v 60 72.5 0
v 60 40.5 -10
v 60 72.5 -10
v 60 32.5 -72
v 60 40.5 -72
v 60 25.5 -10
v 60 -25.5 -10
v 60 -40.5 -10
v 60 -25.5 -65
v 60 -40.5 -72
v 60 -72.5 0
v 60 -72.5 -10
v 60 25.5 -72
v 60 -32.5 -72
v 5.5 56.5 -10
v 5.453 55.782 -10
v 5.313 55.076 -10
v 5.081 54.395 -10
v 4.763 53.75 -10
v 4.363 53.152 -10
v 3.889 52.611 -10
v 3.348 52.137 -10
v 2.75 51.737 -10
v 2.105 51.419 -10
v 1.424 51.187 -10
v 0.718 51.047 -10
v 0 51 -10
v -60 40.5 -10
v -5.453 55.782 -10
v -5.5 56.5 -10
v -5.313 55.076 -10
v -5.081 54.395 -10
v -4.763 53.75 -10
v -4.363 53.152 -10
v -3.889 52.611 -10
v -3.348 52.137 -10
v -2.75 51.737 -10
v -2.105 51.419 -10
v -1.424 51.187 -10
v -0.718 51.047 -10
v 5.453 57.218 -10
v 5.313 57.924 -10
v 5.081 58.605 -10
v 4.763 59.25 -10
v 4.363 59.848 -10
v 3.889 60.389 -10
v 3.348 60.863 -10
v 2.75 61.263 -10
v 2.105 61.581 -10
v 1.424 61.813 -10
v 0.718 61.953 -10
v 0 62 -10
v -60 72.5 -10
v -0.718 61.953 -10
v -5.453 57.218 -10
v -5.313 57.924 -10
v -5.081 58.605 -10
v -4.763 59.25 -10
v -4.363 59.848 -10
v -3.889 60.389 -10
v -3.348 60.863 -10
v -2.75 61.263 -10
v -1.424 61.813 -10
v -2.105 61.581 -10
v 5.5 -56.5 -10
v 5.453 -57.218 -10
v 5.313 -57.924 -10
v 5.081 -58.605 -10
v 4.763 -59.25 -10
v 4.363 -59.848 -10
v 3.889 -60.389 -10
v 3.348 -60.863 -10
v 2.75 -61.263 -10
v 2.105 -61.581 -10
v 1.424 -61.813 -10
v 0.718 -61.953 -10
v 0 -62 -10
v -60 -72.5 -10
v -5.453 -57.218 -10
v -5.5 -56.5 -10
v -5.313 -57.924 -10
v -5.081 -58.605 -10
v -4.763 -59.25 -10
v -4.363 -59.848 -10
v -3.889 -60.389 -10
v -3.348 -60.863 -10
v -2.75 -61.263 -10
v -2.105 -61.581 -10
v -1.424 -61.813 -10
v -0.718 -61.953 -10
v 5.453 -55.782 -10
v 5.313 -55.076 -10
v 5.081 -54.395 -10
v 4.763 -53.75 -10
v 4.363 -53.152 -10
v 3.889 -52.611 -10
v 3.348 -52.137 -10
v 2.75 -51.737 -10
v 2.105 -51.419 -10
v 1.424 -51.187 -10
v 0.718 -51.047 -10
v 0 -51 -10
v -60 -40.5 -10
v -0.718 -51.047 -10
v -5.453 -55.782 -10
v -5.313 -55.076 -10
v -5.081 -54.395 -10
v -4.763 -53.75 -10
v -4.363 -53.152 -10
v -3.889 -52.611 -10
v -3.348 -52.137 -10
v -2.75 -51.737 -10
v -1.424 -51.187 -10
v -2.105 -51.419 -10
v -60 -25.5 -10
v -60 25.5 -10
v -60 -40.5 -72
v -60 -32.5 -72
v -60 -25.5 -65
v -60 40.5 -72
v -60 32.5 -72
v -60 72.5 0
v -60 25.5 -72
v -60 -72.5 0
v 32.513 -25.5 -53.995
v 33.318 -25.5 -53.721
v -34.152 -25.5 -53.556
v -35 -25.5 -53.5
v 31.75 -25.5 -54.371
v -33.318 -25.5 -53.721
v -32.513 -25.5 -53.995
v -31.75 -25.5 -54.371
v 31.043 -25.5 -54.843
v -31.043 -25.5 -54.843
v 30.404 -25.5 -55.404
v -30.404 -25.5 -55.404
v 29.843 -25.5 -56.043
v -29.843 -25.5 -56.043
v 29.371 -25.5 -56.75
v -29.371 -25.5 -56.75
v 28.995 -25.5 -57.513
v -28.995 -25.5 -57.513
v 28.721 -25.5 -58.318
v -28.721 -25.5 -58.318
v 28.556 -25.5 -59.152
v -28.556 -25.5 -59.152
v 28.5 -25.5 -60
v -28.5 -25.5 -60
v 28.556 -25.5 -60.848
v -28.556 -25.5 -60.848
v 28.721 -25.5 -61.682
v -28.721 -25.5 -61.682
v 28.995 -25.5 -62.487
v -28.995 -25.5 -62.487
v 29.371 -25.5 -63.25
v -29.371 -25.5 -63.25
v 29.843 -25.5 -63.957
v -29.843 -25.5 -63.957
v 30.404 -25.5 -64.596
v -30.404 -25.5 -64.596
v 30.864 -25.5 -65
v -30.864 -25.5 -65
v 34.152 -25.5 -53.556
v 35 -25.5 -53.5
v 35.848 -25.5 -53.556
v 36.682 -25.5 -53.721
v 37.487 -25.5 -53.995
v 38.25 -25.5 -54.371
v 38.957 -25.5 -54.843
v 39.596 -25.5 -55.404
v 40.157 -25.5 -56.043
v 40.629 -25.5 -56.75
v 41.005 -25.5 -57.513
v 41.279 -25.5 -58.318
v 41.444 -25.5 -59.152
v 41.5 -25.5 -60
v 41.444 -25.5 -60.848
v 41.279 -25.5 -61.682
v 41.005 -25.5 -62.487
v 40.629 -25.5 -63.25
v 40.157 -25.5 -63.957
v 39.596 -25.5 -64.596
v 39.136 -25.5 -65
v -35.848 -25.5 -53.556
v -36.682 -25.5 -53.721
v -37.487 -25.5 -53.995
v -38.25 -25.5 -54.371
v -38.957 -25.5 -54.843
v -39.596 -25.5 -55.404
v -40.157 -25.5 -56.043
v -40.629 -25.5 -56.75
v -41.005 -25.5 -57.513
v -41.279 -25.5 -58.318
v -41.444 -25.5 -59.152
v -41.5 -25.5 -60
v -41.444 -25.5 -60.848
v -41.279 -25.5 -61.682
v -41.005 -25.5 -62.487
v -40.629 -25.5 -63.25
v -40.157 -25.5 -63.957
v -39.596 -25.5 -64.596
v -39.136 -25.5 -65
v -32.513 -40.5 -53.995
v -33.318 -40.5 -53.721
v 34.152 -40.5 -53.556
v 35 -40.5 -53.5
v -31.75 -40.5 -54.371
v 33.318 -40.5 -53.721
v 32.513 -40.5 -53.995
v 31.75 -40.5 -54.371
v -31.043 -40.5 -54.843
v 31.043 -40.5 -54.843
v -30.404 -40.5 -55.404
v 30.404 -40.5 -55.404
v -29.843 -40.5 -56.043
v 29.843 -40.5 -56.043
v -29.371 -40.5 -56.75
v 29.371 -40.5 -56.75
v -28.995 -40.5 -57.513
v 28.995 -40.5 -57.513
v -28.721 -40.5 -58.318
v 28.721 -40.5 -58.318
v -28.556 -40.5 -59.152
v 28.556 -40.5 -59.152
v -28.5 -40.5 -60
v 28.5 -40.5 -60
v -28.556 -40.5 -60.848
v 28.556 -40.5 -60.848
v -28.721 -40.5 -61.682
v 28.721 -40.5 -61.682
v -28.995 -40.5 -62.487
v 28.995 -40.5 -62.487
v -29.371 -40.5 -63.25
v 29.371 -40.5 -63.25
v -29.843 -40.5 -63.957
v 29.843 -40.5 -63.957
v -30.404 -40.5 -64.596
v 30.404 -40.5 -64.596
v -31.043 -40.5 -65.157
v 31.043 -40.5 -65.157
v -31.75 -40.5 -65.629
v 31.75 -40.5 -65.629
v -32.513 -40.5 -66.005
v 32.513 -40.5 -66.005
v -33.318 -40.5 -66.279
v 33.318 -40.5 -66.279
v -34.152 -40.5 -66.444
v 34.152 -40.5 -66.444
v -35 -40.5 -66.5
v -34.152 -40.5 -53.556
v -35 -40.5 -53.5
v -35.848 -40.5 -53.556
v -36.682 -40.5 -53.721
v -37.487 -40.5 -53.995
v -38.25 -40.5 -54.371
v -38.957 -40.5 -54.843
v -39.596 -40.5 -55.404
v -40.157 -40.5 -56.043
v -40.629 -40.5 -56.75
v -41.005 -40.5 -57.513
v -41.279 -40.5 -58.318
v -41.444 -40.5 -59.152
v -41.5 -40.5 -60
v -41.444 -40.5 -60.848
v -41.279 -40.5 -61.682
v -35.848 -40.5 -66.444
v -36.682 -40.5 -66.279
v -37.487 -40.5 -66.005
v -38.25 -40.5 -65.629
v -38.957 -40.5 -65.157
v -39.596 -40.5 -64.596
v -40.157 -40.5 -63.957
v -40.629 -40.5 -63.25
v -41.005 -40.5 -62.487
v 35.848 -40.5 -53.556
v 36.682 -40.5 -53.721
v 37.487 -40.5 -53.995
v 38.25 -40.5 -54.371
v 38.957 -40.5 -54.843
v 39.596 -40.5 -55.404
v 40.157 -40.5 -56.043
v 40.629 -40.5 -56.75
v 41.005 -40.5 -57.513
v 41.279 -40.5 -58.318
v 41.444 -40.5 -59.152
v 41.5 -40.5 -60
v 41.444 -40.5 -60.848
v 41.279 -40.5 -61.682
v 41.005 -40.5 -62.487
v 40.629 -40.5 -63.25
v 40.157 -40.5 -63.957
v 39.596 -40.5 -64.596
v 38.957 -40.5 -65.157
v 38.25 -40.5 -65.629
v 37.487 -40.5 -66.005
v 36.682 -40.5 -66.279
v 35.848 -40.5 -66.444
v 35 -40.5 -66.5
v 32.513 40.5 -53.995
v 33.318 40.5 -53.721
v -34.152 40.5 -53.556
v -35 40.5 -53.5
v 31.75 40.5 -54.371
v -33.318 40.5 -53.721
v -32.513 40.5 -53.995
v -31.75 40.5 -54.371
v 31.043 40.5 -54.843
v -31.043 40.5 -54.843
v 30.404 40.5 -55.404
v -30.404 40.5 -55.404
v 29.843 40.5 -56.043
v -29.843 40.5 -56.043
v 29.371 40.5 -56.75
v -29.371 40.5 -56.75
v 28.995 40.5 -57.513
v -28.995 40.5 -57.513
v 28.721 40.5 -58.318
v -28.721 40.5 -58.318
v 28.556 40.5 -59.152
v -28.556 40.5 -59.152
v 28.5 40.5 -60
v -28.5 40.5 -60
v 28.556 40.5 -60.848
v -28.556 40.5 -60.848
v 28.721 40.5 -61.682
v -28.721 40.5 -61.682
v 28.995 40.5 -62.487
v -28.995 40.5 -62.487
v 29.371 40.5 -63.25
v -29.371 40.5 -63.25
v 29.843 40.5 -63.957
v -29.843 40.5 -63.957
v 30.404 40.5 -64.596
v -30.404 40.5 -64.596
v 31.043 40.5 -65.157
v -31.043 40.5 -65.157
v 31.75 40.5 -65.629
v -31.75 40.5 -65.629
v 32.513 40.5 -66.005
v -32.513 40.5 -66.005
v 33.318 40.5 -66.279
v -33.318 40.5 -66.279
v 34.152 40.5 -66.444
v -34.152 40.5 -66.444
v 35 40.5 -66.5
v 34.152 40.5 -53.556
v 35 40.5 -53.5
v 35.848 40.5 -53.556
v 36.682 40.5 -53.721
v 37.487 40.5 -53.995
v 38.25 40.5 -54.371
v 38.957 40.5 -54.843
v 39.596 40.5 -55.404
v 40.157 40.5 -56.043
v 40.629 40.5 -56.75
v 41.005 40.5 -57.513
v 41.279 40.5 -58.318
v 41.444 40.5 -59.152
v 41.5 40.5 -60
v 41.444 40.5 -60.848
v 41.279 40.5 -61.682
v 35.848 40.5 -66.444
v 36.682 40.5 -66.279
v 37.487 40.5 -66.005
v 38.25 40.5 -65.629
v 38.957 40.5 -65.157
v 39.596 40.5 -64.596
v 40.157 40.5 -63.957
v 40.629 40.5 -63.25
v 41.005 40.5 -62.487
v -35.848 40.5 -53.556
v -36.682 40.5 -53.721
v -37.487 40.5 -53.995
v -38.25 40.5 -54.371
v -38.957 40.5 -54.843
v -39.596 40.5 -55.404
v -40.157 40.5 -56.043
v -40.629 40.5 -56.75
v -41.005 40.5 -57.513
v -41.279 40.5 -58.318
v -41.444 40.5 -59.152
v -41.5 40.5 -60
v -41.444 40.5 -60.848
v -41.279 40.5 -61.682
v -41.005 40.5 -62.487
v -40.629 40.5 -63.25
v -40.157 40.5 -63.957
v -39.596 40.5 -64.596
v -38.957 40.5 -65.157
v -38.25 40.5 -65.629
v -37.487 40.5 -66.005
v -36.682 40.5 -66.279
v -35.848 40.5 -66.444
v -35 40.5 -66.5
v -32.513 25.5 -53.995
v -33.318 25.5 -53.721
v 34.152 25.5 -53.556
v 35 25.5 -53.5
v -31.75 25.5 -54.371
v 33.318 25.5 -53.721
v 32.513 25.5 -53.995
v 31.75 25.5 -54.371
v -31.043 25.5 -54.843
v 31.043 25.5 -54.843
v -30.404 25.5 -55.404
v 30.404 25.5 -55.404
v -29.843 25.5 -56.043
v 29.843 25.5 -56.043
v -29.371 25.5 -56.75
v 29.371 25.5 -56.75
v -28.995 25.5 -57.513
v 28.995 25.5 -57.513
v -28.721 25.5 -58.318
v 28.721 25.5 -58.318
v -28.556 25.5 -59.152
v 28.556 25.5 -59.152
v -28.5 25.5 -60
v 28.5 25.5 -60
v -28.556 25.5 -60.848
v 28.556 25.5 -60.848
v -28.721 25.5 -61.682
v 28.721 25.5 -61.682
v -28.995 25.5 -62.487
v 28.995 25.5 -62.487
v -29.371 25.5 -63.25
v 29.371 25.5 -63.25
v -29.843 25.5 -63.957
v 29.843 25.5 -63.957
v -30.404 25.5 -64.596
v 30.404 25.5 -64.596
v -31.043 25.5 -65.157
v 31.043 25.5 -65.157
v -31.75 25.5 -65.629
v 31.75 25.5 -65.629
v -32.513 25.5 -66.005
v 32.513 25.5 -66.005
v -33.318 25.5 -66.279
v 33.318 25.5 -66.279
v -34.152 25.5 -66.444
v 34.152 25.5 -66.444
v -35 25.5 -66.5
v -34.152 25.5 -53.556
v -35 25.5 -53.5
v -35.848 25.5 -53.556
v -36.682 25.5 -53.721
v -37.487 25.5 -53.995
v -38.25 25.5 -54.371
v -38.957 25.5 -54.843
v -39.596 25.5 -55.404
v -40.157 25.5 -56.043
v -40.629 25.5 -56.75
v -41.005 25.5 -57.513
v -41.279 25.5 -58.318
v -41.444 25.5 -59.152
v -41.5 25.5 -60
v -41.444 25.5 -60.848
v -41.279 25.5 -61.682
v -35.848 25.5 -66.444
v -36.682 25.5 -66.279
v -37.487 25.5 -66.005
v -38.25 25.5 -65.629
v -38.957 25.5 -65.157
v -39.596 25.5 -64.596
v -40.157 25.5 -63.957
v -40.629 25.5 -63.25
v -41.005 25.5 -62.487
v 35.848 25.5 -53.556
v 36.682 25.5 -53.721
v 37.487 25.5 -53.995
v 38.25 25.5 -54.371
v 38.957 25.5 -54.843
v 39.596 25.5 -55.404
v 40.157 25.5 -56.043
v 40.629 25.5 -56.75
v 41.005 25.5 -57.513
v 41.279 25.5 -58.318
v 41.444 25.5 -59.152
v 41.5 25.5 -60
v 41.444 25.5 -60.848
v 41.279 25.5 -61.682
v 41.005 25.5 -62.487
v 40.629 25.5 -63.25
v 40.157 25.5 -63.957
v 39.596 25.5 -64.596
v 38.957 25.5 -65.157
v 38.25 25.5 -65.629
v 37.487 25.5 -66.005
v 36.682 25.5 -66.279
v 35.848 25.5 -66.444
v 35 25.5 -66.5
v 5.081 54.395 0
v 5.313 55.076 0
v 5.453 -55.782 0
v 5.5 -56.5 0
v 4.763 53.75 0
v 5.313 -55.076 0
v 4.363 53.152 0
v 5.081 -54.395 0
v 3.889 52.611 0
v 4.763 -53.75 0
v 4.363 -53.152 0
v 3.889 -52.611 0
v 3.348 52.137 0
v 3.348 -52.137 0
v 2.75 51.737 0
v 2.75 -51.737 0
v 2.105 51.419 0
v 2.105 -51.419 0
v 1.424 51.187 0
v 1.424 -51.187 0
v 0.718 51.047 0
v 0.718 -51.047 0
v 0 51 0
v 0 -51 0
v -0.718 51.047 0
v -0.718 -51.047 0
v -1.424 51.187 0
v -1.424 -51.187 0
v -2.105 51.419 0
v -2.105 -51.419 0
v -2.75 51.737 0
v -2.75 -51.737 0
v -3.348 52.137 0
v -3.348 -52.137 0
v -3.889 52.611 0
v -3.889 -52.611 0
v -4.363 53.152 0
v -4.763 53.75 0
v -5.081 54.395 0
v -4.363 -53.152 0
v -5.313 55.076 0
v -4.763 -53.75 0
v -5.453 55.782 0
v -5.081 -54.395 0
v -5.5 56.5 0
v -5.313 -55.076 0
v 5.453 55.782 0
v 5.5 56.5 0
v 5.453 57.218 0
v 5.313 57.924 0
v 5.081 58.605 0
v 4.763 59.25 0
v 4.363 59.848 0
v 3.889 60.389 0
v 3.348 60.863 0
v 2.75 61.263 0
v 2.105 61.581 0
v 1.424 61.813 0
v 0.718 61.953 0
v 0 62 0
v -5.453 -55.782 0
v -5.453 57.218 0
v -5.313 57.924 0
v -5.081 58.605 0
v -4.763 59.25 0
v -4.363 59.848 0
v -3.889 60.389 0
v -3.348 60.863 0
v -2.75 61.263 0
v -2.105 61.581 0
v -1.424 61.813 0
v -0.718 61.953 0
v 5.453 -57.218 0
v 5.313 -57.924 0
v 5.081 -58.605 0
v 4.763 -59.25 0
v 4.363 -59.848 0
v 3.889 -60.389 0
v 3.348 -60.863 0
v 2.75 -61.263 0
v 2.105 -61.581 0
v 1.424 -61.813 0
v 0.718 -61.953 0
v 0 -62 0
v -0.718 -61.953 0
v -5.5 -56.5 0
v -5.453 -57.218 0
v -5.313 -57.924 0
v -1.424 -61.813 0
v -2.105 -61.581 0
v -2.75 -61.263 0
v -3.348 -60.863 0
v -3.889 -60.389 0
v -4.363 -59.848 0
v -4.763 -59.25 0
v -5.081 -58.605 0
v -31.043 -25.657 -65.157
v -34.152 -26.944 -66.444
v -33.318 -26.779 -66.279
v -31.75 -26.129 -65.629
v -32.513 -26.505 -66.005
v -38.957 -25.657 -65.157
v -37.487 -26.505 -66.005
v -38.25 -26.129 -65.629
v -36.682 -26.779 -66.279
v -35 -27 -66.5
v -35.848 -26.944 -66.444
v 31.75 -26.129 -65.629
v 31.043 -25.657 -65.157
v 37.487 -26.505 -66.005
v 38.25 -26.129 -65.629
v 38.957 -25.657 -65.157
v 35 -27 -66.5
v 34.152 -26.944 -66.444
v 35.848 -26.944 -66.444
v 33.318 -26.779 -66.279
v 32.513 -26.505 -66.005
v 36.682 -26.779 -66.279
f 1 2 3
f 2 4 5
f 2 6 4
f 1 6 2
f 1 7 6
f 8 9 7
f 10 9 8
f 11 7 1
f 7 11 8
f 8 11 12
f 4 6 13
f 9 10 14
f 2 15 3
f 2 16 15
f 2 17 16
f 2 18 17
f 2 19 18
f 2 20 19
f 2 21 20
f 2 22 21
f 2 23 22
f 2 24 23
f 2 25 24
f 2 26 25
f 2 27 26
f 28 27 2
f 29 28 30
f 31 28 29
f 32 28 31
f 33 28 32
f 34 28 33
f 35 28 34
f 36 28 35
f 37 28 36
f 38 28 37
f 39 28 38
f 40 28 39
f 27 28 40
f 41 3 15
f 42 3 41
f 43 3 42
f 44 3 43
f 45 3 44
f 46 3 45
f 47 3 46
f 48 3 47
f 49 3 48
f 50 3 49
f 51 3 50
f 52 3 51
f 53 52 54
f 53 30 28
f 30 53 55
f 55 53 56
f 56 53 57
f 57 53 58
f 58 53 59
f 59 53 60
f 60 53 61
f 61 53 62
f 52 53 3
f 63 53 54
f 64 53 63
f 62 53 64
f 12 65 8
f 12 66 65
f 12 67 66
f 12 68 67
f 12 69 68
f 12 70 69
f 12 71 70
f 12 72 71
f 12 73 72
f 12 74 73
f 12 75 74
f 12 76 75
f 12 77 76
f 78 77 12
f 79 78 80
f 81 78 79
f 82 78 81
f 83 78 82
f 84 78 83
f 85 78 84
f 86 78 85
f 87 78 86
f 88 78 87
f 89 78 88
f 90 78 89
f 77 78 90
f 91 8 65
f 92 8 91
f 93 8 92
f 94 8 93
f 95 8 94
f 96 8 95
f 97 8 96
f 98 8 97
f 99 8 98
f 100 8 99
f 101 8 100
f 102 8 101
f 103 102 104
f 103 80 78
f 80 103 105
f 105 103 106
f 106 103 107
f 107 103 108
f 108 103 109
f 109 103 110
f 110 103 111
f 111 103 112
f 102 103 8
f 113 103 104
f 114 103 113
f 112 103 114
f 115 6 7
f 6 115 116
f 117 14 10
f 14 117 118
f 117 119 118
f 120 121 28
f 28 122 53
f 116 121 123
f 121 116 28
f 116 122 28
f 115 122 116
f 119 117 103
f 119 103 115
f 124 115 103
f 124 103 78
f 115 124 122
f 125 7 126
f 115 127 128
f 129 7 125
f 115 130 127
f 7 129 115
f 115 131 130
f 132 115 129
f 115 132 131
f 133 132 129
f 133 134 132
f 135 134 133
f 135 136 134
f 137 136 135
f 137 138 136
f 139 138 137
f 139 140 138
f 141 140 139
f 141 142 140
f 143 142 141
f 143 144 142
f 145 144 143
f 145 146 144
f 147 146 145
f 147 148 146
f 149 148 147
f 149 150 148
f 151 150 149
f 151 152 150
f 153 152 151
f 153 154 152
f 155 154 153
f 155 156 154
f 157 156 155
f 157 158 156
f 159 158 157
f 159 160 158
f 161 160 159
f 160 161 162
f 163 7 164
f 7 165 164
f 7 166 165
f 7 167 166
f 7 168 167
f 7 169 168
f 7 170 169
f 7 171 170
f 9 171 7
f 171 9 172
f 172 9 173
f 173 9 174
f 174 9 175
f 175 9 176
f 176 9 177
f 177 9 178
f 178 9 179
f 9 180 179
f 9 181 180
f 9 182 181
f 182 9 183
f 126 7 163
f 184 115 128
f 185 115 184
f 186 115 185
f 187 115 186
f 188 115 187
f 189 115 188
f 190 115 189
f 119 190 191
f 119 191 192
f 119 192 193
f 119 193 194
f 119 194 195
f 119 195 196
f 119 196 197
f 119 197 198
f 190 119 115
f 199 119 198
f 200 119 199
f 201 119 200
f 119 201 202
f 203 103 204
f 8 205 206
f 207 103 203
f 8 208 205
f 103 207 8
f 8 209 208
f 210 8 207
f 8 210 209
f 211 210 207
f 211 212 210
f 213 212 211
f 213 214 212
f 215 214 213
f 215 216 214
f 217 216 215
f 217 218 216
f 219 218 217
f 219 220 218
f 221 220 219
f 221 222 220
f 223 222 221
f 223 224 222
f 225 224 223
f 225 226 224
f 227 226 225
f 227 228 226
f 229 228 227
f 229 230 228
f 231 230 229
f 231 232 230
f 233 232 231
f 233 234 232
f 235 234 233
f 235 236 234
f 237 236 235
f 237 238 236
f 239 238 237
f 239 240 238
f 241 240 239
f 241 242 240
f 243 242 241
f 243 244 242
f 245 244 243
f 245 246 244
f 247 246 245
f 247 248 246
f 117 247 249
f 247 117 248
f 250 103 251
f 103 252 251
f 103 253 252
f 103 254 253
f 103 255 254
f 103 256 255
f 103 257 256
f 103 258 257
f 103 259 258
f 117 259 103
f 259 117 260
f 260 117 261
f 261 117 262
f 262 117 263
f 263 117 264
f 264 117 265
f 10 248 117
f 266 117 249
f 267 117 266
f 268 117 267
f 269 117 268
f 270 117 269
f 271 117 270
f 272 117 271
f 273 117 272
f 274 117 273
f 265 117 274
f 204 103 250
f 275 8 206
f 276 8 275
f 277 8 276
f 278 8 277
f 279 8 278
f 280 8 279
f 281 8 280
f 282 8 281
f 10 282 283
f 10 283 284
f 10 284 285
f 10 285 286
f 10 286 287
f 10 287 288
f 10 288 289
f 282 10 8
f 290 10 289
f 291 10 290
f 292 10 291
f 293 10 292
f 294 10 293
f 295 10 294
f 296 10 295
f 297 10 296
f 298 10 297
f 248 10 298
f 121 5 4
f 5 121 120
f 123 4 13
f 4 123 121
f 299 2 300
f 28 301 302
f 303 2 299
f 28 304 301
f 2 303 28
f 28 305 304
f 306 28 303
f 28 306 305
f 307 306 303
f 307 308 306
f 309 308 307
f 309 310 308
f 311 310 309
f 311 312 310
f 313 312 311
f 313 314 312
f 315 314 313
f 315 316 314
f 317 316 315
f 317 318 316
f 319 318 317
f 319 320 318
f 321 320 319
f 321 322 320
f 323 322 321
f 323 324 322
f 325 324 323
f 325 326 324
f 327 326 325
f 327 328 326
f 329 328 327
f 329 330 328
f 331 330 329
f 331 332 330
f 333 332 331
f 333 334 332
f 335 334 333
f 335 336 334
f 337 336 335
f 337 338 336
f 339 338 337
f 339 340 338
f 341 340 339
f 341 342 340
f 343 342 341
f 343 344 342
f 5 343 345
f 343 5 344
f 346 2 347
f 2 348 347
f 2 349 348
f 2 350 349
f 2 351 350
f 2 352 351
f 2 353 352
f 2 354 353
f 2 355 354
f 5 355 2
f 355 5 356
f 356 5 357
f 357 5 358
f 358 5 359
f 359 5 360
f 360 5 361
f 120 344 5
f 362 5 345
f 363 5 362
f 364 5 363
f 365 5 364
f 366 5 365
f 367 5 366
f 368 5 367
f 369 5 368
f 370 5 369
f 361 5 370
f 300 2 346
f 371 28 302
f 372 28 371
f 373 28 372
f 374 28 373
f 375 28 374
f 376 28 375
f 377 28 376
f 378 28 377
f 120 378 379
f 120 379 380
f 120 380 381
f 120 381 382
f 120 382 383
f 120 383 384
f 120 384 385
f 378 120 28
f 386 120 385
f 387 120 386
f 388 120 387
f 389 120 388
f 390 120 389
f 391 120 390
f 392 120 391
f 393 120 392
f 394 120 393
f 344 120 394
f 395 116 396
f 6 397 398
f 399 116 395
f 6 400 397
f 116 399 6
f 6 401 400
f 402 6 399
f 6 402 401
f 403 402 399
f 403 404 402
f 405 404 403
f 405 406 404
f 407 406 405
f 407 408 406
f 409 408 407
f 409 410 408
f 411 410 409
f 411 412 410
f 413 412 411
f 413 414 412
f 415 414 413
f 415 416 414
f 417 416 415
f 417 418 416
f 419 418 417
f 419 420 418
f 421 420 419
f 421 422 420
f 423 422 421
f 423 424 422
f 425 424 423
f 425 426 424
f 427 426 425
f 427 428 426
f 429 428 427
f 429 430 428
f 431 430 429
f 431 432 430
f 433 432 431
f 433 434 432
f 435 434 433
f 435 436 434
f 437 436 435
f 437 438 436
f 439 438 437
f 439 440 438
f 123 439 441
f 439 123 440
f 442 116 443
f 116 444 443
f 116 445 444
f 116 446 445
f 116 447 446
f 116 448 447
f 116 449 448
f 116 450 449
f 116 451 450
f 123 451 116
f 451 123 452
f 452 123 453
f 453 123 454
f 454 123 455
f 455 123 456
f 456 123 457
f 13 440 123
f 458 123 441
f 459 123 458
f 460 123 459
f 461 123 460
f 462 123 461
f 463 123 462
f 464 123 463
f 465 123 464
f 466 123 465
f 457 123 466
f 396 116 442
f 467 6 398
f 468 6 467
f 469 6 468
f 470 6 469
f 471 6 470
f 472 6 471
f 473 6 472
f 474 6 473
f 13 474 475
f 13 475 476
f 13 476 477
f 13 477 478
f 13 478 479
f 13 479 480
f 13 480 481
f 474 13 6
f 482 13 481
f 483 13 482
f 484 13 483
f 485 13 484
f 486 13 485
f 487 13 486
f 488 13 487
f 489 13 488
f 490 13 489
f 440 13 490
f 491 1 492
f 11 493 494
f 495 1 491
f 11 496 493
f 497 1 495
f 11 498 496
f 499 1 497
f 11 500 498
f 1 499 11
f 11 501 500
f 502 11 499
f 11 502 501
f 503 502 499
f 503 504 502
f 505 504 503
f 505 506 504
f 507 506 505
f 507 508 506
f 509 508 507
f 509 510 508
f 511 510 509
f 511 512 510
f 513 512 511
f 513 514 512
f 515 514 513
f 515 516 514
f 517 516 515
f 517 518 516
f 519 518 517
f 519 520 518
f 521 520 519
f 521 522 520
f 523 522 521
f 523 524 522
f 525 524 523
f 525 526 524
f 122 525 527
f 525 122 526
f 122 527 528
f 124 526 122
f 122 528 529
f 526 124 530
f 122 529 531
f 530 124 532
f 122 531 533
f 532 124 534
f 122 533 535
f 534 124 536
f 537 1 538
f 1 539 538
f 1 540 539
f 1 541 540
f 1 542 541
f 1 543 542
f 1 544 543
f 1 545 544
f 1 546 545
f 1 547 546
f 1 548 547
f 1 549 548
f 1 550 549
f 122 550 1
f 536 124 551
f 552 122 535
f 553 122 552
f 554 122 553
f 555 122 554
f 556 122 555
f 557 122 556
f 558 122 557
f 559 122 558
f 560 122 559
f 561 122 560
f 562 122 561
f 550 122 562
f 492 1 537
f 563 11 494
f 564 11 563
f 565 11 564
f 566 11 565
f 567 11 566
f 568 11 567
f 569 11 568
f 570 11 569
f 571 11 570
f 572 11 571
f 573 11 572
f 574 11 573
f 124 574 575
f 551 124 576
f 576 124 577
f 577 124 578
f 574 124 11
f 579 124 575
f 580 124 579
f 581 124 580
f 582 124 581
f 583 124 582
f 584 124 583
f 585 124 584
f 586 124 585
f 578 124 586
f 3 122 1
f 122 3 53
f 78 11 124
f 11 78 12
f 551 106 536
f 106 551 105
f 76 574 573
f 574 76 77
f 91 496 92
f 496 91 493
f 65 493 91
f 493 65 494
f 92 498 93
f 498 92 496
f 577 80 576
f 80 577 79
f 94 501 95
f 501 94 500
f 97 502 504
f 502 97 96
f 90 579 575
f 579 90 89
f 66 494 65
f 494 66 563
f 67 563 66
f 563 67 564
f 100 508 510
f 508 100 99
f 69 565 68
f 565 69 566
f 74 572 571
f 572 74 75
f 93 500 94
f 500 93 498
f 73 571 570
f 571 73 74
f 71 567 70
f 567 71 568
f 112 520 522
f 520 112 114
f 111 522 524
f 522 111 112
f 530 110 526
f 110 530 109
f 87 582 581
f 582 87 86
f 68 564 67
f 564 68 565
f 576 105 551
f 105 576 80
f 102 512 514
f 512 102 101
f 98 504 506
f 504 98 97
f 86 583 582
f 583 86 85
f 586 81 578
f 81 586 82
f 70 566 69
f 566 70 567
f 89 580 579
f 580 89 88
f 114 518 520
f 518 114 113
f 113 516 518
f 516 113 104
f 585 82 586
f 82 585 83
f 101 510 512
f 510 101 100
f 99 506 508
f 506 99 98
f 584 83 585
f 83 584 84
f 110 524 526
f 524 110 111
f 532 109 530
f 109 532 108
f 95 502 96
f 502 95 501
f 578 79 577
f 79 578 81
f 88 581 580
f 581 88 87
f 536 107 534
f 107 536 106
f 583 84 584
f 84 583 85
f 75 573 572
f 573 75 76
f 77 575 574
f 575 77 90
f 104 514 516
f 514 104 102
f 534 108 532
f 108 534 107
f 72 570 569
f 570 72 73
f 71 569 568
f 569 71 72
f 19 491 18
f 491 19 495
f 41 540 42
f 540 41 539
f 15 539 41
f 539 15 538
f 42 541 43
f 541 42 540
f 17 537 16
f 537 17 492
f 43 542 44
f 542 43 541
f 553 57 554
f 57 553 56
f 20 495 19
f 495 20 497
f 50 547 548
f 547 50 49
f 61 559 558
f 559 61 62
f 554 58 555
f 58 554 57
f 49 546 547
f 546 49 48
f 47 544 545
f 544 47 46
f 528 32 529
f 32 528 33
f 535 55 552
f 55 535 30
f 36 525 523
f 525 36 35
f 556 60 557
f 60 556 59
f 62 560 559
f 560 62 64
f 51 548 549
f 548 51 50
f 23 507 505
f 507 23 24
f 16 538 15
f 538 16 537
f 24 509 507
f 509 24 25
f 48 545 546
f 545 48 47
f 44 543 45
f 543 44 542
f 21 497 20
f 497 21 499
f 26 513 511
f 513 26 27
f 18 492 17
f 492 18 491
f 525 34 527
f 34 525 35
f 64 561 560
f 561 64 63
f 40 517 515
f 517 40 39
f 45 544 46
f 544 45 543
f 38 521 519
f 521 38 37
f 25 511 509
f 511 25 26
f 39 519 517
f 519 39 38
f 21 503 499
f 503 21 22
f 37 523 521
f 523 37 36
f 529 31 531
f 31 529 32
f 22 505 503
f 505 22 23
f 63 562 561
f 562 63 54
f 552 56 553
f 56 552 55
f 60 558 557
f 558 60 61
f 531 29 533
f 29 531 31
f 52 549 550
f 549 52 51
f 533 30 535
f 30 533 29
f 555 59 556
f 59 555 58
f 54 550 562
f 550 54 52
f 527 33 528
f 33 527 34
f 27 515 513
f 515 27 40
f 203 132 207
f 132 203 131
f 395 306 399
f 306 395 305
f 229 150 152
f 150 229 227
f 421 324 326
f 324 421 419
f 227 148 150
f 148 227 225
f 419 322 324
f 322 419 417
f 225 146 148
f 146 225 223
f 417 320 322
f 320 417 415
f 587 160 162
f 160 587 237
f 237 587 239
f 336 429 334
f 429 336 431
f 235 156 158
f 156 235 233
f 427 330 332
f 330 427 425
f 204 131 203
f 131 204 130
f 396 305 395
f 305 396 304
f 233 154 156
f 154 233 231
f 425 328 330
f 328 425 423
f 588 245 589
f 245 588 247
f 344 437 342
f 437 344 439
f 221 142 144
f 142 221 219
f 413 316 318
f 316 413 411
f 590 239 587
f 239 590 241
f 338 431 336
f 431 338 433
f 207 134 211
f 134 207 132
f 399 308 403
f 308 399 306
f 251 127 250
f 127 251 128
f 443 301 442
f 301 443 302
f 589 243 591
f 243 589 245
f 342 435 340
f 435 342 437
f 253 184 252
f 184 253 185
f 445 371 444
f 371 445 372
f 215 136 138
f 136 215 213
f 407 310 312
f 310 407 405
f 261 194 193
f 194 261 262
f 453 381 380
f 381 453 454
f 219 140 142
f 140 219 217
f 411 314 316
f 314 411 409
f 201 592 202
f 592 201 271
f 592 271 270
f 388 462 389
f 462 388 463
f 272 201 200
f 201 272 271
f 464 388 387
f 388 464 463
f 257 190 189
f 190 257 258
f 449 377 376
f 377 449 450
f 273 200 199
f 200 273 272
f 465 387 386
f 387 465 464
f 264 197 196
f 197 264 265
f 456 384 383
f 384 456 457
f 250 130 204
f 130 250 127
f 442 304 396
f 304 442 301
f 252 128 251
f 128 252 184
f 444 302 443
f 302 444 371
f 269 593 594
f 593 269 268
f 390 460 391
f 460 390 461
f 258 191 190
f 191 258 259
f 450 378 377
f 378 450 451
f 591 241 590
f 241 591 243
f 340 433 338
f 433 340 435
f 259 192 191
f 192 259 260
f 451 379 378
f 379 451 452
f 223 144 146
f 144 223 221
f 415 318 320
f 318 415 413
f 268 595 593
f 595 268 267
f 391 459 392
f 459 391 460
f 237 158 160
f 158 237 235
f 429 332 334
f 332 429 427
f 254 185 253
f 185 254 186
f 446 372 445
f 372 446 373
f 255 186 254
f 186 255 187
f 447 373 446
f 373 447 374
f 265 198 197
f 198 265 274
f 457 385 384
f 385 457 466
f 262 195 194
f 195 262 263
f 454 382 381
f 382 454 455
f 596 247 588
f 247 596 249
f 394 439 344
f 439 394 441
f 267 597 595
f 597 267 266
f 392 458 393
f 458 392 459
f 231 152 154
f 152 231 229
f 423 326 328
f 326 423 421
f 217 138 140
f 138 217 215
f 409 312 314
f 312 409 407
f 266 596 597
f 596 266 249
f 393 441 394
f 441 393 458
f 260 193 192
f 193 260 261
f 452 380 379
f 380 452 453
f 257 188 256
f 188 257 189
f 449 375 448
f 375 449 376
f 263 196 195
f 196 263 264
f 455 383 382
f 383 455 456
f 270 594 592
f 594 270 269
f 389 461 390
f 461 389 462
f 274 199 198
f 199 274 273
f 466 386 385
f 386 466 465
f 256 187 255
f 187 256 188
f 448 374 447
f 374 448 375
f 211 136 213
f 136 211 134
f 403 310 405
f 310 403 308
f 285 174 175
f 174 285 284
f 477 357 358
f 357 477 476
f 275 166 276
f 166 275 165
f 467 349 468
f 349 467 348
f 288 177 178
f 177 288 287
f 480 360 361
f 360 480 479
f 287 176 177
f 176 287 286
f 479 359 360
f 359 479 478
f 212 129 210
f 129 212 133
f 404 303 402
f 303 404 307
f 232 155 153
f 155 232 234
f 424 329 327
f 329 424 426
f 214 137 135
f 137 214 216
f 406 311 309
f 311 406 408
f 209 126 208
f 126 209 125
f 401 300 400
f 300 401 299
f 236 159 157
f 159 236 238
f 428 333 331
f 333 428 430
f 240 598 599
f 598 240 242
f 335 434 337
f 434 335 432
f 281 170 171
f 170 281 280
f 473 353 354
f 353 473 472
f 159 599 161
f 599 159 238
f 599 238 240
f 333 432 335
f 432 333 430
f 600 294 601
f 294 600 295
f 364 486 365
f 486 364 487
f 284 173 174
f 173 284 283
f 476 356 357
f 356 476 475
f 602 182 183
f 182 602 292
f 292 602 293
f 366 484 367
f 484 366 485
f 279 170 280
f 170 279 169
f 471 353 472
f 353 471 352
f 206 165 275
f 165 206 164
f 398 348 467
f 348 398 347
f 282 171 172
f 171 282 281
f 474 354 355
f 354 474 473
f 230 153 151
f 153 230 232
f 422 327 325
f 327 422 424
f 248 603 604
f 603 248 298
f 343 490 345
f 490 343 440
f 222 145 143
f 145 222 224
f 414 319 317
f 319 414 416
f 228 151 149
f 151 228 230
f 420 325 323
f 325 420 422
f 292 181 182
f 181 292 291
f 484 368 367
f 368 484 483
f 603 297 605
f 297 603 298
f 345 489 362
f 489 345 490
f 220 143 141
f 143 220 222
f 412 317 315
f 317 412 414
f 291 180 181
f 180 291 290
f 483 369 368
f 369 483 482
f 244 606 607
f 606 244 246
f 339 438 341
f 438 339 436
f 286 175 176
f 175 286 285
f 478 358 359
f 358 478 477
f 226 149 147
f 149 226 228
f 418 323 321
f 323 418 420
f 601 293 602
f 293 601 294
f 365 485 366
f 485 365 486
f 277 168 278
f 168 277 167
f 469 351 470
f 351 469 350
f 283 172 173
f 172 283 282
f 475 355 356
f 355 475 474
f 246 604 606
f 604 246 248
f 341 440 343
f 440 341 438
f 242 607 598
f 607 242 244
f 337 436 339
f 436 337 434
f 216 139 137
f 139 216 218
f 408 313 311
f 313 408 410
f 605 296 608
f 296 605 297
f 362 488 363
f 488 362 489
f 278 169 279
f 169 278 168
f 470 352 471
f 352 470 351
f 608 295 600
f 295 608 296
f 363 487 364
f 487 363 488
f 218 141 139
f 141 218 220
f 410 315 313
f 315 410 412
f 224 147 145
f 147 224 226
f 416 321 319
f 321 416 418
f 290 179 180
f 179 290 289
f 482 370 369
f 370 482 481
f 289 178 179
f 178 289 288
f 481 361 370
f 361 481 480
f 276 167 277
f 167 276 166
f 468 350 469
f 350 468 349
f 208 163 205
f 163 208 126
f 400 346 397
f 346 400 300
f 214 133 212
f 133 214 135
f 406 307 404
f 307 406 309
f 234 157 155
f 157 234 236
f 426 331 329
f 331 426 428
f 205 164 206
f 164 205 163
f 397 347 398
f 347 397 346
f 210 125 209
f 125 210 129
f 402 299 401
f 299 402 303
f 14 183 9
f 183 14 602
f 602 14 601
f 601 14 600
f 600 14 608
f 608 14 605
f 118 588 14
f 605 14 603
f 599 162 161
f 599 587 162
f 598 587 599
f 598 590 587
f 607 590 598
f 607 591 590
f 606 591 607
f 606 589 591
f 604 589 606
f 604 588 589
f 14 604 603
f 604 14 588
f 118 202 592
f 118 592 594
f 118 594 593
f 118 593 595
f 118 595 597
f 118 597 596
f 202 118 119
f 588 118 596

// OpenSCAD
/*
 * Offroad Adventure Trailer - Drawbar Cradle (CNC-milled 6082-T6)
 *
 * WHY (see scripts/beam_check.py, check_joint_hole): the weak point of the
 * bolted drawbar is not the beam — it is the 13 mm bolt hole through the
 * tension flange at the FRONT crossbeam, exactly where the bending moment
 * peaks (net-section fatigue margin only ~1.3x vs 3-4x everywhere else).
 *
 * THE FIX: don't pierce the flanges at the peak-moment joint. This milled
 * aluminum cradle replaces the flat spacer plate:
 *   - The WEB (10 mm, same as the old spacer) transfers vertical load
 *     between beam top flange and crossbeam bottom face over a full
 *     120 x 80 mm footprint.
 *   - Two VERTICAL M10 bolts pass BESIDE the beam (through web wings +
 *     crossbeam with crush sleeves) — zero holes in the beam flanges.
 *   - Two CHEEKS grip the beam sides; two HORIZONTAL M12 bolts pass
 *     through cheeks + beam webs at MID-HEIGHT = the neutral axis, where
 *     bending stress is ~zero. Holes there cost nothing in fatigue.
 *   - Tolerance-friendly: the channel has `fit_clr` play, the beam can
 *     sit anywhere along its length (nothing references the beam's end
 *     cuts), and the horizontal holes are match-drilled at assembly.
 *
 * Use at the front crossbeam (peak moment). The axle-crossbeam lap keeps
 * plain through-bolts + spacer plate (moment there is far smaller and a
 * positive location point is wanted).
 *
 * Origin: center of the crossbeam contact face (top of web), Z down = beam.
 */

bar_w = 50;        // drawbar width  (VKR 100x50x4 standing)
bar_h = 100;       // drawbar height
tube_w = 50;       // crossbeam width (VKR 50x50x3)
web_t = 10;        // web thickness = old spacer plate thickness
cheek_t = 15;      // side cheek thickness
cheek_drop = 62;   // cheeks reach past mid-height of the beam
block_len = 120;   // along the drawbar (X)
fit_clr = 0.5;     // channel clearance per side — mm of "playroom"
d_m10 = 11;        // vertical bolts (beside the beam, into the crossbeam)
d_m12 = 13;        // horizontal bolts (through the beam webs, neutral axis)

wing_w = 32;       // web wings extending PAST the cheeks (nut/washer space
                   // for the vertical bolts — they must clear the cheeks)

block_w = bar_w + 2*fit_clr + 2*cheek_t;   // width across cheeks
web_w   = block_w + 2*wing_w;              // full web width incl. wings

$fn = 48;

module drawbar_cradle() {
    color("LightSteelBlue")
    difference() {
        union() {
            // Web (spacer layer between crossbeam and beam top), with
            // wings sticking out past the cheeks on both sides
            translate([-block_len/2, -web_w/2, -web_t])
                cube([block_len, web_w, web_t]);
            // Cheeks flanking the beam
            for (s = [-1, 1])
                translate([-block_len/2,
                           s*(bar_w/2 + fit_clr) + (s < 0 ? -cheek_t : 0),
                           -web_t - cheek_drop])
                    cube([block_len, cheek_t, cheek_drop]);
        }
        // Vertical M10 holes in the WINGS (clear of both beam and cheeks;
        // bolt runs up through the crossbeam with a crush sleeve)
        for (s = [-1, 1])
            translate([0, s*(block_w/2 + wing_w/2), -web_t - 1])
                cylinder(d = d_m10, h = web_t + 2);
        // Horizontal M12 holes at the beam's NEUTRAL AXIS (z = -web_t - bar_h/2)
        for (x = [-35, 35])
            translate([x, -block_w/2 - 1, -web_t - bar_h/2])
                rotate([-90, 0, 0])
                    cylinder(d = d_m12, h = block_w + 2);
        // Chamfer the cheek bottom edges (snag protection)
        for (s = [-1, 1])
            translate([-block_len/2 - 1,
                       s*(bar_w/2 + fit_clr + cheek_t) + (s < 0 ? 8 : -8),
                       -web_t - cheek_drop])
                rotate([s < 0 ? -45 : 225, 0, 0])
                    cube([block_len + 2, 14, 14]);
    }
}

drawbar_cradle();

// Ghost context: drawbar below, crossbeam above
%color("gray", 0.4) translate([-200, -bar_w/2, -web_t - bar_h])
    cube([400, bar_w, bar_h]);
%color("gray", 0.4) translate([-tube_w/2, -160, 0])
    cube([tube_w, 320, tube_w]);
